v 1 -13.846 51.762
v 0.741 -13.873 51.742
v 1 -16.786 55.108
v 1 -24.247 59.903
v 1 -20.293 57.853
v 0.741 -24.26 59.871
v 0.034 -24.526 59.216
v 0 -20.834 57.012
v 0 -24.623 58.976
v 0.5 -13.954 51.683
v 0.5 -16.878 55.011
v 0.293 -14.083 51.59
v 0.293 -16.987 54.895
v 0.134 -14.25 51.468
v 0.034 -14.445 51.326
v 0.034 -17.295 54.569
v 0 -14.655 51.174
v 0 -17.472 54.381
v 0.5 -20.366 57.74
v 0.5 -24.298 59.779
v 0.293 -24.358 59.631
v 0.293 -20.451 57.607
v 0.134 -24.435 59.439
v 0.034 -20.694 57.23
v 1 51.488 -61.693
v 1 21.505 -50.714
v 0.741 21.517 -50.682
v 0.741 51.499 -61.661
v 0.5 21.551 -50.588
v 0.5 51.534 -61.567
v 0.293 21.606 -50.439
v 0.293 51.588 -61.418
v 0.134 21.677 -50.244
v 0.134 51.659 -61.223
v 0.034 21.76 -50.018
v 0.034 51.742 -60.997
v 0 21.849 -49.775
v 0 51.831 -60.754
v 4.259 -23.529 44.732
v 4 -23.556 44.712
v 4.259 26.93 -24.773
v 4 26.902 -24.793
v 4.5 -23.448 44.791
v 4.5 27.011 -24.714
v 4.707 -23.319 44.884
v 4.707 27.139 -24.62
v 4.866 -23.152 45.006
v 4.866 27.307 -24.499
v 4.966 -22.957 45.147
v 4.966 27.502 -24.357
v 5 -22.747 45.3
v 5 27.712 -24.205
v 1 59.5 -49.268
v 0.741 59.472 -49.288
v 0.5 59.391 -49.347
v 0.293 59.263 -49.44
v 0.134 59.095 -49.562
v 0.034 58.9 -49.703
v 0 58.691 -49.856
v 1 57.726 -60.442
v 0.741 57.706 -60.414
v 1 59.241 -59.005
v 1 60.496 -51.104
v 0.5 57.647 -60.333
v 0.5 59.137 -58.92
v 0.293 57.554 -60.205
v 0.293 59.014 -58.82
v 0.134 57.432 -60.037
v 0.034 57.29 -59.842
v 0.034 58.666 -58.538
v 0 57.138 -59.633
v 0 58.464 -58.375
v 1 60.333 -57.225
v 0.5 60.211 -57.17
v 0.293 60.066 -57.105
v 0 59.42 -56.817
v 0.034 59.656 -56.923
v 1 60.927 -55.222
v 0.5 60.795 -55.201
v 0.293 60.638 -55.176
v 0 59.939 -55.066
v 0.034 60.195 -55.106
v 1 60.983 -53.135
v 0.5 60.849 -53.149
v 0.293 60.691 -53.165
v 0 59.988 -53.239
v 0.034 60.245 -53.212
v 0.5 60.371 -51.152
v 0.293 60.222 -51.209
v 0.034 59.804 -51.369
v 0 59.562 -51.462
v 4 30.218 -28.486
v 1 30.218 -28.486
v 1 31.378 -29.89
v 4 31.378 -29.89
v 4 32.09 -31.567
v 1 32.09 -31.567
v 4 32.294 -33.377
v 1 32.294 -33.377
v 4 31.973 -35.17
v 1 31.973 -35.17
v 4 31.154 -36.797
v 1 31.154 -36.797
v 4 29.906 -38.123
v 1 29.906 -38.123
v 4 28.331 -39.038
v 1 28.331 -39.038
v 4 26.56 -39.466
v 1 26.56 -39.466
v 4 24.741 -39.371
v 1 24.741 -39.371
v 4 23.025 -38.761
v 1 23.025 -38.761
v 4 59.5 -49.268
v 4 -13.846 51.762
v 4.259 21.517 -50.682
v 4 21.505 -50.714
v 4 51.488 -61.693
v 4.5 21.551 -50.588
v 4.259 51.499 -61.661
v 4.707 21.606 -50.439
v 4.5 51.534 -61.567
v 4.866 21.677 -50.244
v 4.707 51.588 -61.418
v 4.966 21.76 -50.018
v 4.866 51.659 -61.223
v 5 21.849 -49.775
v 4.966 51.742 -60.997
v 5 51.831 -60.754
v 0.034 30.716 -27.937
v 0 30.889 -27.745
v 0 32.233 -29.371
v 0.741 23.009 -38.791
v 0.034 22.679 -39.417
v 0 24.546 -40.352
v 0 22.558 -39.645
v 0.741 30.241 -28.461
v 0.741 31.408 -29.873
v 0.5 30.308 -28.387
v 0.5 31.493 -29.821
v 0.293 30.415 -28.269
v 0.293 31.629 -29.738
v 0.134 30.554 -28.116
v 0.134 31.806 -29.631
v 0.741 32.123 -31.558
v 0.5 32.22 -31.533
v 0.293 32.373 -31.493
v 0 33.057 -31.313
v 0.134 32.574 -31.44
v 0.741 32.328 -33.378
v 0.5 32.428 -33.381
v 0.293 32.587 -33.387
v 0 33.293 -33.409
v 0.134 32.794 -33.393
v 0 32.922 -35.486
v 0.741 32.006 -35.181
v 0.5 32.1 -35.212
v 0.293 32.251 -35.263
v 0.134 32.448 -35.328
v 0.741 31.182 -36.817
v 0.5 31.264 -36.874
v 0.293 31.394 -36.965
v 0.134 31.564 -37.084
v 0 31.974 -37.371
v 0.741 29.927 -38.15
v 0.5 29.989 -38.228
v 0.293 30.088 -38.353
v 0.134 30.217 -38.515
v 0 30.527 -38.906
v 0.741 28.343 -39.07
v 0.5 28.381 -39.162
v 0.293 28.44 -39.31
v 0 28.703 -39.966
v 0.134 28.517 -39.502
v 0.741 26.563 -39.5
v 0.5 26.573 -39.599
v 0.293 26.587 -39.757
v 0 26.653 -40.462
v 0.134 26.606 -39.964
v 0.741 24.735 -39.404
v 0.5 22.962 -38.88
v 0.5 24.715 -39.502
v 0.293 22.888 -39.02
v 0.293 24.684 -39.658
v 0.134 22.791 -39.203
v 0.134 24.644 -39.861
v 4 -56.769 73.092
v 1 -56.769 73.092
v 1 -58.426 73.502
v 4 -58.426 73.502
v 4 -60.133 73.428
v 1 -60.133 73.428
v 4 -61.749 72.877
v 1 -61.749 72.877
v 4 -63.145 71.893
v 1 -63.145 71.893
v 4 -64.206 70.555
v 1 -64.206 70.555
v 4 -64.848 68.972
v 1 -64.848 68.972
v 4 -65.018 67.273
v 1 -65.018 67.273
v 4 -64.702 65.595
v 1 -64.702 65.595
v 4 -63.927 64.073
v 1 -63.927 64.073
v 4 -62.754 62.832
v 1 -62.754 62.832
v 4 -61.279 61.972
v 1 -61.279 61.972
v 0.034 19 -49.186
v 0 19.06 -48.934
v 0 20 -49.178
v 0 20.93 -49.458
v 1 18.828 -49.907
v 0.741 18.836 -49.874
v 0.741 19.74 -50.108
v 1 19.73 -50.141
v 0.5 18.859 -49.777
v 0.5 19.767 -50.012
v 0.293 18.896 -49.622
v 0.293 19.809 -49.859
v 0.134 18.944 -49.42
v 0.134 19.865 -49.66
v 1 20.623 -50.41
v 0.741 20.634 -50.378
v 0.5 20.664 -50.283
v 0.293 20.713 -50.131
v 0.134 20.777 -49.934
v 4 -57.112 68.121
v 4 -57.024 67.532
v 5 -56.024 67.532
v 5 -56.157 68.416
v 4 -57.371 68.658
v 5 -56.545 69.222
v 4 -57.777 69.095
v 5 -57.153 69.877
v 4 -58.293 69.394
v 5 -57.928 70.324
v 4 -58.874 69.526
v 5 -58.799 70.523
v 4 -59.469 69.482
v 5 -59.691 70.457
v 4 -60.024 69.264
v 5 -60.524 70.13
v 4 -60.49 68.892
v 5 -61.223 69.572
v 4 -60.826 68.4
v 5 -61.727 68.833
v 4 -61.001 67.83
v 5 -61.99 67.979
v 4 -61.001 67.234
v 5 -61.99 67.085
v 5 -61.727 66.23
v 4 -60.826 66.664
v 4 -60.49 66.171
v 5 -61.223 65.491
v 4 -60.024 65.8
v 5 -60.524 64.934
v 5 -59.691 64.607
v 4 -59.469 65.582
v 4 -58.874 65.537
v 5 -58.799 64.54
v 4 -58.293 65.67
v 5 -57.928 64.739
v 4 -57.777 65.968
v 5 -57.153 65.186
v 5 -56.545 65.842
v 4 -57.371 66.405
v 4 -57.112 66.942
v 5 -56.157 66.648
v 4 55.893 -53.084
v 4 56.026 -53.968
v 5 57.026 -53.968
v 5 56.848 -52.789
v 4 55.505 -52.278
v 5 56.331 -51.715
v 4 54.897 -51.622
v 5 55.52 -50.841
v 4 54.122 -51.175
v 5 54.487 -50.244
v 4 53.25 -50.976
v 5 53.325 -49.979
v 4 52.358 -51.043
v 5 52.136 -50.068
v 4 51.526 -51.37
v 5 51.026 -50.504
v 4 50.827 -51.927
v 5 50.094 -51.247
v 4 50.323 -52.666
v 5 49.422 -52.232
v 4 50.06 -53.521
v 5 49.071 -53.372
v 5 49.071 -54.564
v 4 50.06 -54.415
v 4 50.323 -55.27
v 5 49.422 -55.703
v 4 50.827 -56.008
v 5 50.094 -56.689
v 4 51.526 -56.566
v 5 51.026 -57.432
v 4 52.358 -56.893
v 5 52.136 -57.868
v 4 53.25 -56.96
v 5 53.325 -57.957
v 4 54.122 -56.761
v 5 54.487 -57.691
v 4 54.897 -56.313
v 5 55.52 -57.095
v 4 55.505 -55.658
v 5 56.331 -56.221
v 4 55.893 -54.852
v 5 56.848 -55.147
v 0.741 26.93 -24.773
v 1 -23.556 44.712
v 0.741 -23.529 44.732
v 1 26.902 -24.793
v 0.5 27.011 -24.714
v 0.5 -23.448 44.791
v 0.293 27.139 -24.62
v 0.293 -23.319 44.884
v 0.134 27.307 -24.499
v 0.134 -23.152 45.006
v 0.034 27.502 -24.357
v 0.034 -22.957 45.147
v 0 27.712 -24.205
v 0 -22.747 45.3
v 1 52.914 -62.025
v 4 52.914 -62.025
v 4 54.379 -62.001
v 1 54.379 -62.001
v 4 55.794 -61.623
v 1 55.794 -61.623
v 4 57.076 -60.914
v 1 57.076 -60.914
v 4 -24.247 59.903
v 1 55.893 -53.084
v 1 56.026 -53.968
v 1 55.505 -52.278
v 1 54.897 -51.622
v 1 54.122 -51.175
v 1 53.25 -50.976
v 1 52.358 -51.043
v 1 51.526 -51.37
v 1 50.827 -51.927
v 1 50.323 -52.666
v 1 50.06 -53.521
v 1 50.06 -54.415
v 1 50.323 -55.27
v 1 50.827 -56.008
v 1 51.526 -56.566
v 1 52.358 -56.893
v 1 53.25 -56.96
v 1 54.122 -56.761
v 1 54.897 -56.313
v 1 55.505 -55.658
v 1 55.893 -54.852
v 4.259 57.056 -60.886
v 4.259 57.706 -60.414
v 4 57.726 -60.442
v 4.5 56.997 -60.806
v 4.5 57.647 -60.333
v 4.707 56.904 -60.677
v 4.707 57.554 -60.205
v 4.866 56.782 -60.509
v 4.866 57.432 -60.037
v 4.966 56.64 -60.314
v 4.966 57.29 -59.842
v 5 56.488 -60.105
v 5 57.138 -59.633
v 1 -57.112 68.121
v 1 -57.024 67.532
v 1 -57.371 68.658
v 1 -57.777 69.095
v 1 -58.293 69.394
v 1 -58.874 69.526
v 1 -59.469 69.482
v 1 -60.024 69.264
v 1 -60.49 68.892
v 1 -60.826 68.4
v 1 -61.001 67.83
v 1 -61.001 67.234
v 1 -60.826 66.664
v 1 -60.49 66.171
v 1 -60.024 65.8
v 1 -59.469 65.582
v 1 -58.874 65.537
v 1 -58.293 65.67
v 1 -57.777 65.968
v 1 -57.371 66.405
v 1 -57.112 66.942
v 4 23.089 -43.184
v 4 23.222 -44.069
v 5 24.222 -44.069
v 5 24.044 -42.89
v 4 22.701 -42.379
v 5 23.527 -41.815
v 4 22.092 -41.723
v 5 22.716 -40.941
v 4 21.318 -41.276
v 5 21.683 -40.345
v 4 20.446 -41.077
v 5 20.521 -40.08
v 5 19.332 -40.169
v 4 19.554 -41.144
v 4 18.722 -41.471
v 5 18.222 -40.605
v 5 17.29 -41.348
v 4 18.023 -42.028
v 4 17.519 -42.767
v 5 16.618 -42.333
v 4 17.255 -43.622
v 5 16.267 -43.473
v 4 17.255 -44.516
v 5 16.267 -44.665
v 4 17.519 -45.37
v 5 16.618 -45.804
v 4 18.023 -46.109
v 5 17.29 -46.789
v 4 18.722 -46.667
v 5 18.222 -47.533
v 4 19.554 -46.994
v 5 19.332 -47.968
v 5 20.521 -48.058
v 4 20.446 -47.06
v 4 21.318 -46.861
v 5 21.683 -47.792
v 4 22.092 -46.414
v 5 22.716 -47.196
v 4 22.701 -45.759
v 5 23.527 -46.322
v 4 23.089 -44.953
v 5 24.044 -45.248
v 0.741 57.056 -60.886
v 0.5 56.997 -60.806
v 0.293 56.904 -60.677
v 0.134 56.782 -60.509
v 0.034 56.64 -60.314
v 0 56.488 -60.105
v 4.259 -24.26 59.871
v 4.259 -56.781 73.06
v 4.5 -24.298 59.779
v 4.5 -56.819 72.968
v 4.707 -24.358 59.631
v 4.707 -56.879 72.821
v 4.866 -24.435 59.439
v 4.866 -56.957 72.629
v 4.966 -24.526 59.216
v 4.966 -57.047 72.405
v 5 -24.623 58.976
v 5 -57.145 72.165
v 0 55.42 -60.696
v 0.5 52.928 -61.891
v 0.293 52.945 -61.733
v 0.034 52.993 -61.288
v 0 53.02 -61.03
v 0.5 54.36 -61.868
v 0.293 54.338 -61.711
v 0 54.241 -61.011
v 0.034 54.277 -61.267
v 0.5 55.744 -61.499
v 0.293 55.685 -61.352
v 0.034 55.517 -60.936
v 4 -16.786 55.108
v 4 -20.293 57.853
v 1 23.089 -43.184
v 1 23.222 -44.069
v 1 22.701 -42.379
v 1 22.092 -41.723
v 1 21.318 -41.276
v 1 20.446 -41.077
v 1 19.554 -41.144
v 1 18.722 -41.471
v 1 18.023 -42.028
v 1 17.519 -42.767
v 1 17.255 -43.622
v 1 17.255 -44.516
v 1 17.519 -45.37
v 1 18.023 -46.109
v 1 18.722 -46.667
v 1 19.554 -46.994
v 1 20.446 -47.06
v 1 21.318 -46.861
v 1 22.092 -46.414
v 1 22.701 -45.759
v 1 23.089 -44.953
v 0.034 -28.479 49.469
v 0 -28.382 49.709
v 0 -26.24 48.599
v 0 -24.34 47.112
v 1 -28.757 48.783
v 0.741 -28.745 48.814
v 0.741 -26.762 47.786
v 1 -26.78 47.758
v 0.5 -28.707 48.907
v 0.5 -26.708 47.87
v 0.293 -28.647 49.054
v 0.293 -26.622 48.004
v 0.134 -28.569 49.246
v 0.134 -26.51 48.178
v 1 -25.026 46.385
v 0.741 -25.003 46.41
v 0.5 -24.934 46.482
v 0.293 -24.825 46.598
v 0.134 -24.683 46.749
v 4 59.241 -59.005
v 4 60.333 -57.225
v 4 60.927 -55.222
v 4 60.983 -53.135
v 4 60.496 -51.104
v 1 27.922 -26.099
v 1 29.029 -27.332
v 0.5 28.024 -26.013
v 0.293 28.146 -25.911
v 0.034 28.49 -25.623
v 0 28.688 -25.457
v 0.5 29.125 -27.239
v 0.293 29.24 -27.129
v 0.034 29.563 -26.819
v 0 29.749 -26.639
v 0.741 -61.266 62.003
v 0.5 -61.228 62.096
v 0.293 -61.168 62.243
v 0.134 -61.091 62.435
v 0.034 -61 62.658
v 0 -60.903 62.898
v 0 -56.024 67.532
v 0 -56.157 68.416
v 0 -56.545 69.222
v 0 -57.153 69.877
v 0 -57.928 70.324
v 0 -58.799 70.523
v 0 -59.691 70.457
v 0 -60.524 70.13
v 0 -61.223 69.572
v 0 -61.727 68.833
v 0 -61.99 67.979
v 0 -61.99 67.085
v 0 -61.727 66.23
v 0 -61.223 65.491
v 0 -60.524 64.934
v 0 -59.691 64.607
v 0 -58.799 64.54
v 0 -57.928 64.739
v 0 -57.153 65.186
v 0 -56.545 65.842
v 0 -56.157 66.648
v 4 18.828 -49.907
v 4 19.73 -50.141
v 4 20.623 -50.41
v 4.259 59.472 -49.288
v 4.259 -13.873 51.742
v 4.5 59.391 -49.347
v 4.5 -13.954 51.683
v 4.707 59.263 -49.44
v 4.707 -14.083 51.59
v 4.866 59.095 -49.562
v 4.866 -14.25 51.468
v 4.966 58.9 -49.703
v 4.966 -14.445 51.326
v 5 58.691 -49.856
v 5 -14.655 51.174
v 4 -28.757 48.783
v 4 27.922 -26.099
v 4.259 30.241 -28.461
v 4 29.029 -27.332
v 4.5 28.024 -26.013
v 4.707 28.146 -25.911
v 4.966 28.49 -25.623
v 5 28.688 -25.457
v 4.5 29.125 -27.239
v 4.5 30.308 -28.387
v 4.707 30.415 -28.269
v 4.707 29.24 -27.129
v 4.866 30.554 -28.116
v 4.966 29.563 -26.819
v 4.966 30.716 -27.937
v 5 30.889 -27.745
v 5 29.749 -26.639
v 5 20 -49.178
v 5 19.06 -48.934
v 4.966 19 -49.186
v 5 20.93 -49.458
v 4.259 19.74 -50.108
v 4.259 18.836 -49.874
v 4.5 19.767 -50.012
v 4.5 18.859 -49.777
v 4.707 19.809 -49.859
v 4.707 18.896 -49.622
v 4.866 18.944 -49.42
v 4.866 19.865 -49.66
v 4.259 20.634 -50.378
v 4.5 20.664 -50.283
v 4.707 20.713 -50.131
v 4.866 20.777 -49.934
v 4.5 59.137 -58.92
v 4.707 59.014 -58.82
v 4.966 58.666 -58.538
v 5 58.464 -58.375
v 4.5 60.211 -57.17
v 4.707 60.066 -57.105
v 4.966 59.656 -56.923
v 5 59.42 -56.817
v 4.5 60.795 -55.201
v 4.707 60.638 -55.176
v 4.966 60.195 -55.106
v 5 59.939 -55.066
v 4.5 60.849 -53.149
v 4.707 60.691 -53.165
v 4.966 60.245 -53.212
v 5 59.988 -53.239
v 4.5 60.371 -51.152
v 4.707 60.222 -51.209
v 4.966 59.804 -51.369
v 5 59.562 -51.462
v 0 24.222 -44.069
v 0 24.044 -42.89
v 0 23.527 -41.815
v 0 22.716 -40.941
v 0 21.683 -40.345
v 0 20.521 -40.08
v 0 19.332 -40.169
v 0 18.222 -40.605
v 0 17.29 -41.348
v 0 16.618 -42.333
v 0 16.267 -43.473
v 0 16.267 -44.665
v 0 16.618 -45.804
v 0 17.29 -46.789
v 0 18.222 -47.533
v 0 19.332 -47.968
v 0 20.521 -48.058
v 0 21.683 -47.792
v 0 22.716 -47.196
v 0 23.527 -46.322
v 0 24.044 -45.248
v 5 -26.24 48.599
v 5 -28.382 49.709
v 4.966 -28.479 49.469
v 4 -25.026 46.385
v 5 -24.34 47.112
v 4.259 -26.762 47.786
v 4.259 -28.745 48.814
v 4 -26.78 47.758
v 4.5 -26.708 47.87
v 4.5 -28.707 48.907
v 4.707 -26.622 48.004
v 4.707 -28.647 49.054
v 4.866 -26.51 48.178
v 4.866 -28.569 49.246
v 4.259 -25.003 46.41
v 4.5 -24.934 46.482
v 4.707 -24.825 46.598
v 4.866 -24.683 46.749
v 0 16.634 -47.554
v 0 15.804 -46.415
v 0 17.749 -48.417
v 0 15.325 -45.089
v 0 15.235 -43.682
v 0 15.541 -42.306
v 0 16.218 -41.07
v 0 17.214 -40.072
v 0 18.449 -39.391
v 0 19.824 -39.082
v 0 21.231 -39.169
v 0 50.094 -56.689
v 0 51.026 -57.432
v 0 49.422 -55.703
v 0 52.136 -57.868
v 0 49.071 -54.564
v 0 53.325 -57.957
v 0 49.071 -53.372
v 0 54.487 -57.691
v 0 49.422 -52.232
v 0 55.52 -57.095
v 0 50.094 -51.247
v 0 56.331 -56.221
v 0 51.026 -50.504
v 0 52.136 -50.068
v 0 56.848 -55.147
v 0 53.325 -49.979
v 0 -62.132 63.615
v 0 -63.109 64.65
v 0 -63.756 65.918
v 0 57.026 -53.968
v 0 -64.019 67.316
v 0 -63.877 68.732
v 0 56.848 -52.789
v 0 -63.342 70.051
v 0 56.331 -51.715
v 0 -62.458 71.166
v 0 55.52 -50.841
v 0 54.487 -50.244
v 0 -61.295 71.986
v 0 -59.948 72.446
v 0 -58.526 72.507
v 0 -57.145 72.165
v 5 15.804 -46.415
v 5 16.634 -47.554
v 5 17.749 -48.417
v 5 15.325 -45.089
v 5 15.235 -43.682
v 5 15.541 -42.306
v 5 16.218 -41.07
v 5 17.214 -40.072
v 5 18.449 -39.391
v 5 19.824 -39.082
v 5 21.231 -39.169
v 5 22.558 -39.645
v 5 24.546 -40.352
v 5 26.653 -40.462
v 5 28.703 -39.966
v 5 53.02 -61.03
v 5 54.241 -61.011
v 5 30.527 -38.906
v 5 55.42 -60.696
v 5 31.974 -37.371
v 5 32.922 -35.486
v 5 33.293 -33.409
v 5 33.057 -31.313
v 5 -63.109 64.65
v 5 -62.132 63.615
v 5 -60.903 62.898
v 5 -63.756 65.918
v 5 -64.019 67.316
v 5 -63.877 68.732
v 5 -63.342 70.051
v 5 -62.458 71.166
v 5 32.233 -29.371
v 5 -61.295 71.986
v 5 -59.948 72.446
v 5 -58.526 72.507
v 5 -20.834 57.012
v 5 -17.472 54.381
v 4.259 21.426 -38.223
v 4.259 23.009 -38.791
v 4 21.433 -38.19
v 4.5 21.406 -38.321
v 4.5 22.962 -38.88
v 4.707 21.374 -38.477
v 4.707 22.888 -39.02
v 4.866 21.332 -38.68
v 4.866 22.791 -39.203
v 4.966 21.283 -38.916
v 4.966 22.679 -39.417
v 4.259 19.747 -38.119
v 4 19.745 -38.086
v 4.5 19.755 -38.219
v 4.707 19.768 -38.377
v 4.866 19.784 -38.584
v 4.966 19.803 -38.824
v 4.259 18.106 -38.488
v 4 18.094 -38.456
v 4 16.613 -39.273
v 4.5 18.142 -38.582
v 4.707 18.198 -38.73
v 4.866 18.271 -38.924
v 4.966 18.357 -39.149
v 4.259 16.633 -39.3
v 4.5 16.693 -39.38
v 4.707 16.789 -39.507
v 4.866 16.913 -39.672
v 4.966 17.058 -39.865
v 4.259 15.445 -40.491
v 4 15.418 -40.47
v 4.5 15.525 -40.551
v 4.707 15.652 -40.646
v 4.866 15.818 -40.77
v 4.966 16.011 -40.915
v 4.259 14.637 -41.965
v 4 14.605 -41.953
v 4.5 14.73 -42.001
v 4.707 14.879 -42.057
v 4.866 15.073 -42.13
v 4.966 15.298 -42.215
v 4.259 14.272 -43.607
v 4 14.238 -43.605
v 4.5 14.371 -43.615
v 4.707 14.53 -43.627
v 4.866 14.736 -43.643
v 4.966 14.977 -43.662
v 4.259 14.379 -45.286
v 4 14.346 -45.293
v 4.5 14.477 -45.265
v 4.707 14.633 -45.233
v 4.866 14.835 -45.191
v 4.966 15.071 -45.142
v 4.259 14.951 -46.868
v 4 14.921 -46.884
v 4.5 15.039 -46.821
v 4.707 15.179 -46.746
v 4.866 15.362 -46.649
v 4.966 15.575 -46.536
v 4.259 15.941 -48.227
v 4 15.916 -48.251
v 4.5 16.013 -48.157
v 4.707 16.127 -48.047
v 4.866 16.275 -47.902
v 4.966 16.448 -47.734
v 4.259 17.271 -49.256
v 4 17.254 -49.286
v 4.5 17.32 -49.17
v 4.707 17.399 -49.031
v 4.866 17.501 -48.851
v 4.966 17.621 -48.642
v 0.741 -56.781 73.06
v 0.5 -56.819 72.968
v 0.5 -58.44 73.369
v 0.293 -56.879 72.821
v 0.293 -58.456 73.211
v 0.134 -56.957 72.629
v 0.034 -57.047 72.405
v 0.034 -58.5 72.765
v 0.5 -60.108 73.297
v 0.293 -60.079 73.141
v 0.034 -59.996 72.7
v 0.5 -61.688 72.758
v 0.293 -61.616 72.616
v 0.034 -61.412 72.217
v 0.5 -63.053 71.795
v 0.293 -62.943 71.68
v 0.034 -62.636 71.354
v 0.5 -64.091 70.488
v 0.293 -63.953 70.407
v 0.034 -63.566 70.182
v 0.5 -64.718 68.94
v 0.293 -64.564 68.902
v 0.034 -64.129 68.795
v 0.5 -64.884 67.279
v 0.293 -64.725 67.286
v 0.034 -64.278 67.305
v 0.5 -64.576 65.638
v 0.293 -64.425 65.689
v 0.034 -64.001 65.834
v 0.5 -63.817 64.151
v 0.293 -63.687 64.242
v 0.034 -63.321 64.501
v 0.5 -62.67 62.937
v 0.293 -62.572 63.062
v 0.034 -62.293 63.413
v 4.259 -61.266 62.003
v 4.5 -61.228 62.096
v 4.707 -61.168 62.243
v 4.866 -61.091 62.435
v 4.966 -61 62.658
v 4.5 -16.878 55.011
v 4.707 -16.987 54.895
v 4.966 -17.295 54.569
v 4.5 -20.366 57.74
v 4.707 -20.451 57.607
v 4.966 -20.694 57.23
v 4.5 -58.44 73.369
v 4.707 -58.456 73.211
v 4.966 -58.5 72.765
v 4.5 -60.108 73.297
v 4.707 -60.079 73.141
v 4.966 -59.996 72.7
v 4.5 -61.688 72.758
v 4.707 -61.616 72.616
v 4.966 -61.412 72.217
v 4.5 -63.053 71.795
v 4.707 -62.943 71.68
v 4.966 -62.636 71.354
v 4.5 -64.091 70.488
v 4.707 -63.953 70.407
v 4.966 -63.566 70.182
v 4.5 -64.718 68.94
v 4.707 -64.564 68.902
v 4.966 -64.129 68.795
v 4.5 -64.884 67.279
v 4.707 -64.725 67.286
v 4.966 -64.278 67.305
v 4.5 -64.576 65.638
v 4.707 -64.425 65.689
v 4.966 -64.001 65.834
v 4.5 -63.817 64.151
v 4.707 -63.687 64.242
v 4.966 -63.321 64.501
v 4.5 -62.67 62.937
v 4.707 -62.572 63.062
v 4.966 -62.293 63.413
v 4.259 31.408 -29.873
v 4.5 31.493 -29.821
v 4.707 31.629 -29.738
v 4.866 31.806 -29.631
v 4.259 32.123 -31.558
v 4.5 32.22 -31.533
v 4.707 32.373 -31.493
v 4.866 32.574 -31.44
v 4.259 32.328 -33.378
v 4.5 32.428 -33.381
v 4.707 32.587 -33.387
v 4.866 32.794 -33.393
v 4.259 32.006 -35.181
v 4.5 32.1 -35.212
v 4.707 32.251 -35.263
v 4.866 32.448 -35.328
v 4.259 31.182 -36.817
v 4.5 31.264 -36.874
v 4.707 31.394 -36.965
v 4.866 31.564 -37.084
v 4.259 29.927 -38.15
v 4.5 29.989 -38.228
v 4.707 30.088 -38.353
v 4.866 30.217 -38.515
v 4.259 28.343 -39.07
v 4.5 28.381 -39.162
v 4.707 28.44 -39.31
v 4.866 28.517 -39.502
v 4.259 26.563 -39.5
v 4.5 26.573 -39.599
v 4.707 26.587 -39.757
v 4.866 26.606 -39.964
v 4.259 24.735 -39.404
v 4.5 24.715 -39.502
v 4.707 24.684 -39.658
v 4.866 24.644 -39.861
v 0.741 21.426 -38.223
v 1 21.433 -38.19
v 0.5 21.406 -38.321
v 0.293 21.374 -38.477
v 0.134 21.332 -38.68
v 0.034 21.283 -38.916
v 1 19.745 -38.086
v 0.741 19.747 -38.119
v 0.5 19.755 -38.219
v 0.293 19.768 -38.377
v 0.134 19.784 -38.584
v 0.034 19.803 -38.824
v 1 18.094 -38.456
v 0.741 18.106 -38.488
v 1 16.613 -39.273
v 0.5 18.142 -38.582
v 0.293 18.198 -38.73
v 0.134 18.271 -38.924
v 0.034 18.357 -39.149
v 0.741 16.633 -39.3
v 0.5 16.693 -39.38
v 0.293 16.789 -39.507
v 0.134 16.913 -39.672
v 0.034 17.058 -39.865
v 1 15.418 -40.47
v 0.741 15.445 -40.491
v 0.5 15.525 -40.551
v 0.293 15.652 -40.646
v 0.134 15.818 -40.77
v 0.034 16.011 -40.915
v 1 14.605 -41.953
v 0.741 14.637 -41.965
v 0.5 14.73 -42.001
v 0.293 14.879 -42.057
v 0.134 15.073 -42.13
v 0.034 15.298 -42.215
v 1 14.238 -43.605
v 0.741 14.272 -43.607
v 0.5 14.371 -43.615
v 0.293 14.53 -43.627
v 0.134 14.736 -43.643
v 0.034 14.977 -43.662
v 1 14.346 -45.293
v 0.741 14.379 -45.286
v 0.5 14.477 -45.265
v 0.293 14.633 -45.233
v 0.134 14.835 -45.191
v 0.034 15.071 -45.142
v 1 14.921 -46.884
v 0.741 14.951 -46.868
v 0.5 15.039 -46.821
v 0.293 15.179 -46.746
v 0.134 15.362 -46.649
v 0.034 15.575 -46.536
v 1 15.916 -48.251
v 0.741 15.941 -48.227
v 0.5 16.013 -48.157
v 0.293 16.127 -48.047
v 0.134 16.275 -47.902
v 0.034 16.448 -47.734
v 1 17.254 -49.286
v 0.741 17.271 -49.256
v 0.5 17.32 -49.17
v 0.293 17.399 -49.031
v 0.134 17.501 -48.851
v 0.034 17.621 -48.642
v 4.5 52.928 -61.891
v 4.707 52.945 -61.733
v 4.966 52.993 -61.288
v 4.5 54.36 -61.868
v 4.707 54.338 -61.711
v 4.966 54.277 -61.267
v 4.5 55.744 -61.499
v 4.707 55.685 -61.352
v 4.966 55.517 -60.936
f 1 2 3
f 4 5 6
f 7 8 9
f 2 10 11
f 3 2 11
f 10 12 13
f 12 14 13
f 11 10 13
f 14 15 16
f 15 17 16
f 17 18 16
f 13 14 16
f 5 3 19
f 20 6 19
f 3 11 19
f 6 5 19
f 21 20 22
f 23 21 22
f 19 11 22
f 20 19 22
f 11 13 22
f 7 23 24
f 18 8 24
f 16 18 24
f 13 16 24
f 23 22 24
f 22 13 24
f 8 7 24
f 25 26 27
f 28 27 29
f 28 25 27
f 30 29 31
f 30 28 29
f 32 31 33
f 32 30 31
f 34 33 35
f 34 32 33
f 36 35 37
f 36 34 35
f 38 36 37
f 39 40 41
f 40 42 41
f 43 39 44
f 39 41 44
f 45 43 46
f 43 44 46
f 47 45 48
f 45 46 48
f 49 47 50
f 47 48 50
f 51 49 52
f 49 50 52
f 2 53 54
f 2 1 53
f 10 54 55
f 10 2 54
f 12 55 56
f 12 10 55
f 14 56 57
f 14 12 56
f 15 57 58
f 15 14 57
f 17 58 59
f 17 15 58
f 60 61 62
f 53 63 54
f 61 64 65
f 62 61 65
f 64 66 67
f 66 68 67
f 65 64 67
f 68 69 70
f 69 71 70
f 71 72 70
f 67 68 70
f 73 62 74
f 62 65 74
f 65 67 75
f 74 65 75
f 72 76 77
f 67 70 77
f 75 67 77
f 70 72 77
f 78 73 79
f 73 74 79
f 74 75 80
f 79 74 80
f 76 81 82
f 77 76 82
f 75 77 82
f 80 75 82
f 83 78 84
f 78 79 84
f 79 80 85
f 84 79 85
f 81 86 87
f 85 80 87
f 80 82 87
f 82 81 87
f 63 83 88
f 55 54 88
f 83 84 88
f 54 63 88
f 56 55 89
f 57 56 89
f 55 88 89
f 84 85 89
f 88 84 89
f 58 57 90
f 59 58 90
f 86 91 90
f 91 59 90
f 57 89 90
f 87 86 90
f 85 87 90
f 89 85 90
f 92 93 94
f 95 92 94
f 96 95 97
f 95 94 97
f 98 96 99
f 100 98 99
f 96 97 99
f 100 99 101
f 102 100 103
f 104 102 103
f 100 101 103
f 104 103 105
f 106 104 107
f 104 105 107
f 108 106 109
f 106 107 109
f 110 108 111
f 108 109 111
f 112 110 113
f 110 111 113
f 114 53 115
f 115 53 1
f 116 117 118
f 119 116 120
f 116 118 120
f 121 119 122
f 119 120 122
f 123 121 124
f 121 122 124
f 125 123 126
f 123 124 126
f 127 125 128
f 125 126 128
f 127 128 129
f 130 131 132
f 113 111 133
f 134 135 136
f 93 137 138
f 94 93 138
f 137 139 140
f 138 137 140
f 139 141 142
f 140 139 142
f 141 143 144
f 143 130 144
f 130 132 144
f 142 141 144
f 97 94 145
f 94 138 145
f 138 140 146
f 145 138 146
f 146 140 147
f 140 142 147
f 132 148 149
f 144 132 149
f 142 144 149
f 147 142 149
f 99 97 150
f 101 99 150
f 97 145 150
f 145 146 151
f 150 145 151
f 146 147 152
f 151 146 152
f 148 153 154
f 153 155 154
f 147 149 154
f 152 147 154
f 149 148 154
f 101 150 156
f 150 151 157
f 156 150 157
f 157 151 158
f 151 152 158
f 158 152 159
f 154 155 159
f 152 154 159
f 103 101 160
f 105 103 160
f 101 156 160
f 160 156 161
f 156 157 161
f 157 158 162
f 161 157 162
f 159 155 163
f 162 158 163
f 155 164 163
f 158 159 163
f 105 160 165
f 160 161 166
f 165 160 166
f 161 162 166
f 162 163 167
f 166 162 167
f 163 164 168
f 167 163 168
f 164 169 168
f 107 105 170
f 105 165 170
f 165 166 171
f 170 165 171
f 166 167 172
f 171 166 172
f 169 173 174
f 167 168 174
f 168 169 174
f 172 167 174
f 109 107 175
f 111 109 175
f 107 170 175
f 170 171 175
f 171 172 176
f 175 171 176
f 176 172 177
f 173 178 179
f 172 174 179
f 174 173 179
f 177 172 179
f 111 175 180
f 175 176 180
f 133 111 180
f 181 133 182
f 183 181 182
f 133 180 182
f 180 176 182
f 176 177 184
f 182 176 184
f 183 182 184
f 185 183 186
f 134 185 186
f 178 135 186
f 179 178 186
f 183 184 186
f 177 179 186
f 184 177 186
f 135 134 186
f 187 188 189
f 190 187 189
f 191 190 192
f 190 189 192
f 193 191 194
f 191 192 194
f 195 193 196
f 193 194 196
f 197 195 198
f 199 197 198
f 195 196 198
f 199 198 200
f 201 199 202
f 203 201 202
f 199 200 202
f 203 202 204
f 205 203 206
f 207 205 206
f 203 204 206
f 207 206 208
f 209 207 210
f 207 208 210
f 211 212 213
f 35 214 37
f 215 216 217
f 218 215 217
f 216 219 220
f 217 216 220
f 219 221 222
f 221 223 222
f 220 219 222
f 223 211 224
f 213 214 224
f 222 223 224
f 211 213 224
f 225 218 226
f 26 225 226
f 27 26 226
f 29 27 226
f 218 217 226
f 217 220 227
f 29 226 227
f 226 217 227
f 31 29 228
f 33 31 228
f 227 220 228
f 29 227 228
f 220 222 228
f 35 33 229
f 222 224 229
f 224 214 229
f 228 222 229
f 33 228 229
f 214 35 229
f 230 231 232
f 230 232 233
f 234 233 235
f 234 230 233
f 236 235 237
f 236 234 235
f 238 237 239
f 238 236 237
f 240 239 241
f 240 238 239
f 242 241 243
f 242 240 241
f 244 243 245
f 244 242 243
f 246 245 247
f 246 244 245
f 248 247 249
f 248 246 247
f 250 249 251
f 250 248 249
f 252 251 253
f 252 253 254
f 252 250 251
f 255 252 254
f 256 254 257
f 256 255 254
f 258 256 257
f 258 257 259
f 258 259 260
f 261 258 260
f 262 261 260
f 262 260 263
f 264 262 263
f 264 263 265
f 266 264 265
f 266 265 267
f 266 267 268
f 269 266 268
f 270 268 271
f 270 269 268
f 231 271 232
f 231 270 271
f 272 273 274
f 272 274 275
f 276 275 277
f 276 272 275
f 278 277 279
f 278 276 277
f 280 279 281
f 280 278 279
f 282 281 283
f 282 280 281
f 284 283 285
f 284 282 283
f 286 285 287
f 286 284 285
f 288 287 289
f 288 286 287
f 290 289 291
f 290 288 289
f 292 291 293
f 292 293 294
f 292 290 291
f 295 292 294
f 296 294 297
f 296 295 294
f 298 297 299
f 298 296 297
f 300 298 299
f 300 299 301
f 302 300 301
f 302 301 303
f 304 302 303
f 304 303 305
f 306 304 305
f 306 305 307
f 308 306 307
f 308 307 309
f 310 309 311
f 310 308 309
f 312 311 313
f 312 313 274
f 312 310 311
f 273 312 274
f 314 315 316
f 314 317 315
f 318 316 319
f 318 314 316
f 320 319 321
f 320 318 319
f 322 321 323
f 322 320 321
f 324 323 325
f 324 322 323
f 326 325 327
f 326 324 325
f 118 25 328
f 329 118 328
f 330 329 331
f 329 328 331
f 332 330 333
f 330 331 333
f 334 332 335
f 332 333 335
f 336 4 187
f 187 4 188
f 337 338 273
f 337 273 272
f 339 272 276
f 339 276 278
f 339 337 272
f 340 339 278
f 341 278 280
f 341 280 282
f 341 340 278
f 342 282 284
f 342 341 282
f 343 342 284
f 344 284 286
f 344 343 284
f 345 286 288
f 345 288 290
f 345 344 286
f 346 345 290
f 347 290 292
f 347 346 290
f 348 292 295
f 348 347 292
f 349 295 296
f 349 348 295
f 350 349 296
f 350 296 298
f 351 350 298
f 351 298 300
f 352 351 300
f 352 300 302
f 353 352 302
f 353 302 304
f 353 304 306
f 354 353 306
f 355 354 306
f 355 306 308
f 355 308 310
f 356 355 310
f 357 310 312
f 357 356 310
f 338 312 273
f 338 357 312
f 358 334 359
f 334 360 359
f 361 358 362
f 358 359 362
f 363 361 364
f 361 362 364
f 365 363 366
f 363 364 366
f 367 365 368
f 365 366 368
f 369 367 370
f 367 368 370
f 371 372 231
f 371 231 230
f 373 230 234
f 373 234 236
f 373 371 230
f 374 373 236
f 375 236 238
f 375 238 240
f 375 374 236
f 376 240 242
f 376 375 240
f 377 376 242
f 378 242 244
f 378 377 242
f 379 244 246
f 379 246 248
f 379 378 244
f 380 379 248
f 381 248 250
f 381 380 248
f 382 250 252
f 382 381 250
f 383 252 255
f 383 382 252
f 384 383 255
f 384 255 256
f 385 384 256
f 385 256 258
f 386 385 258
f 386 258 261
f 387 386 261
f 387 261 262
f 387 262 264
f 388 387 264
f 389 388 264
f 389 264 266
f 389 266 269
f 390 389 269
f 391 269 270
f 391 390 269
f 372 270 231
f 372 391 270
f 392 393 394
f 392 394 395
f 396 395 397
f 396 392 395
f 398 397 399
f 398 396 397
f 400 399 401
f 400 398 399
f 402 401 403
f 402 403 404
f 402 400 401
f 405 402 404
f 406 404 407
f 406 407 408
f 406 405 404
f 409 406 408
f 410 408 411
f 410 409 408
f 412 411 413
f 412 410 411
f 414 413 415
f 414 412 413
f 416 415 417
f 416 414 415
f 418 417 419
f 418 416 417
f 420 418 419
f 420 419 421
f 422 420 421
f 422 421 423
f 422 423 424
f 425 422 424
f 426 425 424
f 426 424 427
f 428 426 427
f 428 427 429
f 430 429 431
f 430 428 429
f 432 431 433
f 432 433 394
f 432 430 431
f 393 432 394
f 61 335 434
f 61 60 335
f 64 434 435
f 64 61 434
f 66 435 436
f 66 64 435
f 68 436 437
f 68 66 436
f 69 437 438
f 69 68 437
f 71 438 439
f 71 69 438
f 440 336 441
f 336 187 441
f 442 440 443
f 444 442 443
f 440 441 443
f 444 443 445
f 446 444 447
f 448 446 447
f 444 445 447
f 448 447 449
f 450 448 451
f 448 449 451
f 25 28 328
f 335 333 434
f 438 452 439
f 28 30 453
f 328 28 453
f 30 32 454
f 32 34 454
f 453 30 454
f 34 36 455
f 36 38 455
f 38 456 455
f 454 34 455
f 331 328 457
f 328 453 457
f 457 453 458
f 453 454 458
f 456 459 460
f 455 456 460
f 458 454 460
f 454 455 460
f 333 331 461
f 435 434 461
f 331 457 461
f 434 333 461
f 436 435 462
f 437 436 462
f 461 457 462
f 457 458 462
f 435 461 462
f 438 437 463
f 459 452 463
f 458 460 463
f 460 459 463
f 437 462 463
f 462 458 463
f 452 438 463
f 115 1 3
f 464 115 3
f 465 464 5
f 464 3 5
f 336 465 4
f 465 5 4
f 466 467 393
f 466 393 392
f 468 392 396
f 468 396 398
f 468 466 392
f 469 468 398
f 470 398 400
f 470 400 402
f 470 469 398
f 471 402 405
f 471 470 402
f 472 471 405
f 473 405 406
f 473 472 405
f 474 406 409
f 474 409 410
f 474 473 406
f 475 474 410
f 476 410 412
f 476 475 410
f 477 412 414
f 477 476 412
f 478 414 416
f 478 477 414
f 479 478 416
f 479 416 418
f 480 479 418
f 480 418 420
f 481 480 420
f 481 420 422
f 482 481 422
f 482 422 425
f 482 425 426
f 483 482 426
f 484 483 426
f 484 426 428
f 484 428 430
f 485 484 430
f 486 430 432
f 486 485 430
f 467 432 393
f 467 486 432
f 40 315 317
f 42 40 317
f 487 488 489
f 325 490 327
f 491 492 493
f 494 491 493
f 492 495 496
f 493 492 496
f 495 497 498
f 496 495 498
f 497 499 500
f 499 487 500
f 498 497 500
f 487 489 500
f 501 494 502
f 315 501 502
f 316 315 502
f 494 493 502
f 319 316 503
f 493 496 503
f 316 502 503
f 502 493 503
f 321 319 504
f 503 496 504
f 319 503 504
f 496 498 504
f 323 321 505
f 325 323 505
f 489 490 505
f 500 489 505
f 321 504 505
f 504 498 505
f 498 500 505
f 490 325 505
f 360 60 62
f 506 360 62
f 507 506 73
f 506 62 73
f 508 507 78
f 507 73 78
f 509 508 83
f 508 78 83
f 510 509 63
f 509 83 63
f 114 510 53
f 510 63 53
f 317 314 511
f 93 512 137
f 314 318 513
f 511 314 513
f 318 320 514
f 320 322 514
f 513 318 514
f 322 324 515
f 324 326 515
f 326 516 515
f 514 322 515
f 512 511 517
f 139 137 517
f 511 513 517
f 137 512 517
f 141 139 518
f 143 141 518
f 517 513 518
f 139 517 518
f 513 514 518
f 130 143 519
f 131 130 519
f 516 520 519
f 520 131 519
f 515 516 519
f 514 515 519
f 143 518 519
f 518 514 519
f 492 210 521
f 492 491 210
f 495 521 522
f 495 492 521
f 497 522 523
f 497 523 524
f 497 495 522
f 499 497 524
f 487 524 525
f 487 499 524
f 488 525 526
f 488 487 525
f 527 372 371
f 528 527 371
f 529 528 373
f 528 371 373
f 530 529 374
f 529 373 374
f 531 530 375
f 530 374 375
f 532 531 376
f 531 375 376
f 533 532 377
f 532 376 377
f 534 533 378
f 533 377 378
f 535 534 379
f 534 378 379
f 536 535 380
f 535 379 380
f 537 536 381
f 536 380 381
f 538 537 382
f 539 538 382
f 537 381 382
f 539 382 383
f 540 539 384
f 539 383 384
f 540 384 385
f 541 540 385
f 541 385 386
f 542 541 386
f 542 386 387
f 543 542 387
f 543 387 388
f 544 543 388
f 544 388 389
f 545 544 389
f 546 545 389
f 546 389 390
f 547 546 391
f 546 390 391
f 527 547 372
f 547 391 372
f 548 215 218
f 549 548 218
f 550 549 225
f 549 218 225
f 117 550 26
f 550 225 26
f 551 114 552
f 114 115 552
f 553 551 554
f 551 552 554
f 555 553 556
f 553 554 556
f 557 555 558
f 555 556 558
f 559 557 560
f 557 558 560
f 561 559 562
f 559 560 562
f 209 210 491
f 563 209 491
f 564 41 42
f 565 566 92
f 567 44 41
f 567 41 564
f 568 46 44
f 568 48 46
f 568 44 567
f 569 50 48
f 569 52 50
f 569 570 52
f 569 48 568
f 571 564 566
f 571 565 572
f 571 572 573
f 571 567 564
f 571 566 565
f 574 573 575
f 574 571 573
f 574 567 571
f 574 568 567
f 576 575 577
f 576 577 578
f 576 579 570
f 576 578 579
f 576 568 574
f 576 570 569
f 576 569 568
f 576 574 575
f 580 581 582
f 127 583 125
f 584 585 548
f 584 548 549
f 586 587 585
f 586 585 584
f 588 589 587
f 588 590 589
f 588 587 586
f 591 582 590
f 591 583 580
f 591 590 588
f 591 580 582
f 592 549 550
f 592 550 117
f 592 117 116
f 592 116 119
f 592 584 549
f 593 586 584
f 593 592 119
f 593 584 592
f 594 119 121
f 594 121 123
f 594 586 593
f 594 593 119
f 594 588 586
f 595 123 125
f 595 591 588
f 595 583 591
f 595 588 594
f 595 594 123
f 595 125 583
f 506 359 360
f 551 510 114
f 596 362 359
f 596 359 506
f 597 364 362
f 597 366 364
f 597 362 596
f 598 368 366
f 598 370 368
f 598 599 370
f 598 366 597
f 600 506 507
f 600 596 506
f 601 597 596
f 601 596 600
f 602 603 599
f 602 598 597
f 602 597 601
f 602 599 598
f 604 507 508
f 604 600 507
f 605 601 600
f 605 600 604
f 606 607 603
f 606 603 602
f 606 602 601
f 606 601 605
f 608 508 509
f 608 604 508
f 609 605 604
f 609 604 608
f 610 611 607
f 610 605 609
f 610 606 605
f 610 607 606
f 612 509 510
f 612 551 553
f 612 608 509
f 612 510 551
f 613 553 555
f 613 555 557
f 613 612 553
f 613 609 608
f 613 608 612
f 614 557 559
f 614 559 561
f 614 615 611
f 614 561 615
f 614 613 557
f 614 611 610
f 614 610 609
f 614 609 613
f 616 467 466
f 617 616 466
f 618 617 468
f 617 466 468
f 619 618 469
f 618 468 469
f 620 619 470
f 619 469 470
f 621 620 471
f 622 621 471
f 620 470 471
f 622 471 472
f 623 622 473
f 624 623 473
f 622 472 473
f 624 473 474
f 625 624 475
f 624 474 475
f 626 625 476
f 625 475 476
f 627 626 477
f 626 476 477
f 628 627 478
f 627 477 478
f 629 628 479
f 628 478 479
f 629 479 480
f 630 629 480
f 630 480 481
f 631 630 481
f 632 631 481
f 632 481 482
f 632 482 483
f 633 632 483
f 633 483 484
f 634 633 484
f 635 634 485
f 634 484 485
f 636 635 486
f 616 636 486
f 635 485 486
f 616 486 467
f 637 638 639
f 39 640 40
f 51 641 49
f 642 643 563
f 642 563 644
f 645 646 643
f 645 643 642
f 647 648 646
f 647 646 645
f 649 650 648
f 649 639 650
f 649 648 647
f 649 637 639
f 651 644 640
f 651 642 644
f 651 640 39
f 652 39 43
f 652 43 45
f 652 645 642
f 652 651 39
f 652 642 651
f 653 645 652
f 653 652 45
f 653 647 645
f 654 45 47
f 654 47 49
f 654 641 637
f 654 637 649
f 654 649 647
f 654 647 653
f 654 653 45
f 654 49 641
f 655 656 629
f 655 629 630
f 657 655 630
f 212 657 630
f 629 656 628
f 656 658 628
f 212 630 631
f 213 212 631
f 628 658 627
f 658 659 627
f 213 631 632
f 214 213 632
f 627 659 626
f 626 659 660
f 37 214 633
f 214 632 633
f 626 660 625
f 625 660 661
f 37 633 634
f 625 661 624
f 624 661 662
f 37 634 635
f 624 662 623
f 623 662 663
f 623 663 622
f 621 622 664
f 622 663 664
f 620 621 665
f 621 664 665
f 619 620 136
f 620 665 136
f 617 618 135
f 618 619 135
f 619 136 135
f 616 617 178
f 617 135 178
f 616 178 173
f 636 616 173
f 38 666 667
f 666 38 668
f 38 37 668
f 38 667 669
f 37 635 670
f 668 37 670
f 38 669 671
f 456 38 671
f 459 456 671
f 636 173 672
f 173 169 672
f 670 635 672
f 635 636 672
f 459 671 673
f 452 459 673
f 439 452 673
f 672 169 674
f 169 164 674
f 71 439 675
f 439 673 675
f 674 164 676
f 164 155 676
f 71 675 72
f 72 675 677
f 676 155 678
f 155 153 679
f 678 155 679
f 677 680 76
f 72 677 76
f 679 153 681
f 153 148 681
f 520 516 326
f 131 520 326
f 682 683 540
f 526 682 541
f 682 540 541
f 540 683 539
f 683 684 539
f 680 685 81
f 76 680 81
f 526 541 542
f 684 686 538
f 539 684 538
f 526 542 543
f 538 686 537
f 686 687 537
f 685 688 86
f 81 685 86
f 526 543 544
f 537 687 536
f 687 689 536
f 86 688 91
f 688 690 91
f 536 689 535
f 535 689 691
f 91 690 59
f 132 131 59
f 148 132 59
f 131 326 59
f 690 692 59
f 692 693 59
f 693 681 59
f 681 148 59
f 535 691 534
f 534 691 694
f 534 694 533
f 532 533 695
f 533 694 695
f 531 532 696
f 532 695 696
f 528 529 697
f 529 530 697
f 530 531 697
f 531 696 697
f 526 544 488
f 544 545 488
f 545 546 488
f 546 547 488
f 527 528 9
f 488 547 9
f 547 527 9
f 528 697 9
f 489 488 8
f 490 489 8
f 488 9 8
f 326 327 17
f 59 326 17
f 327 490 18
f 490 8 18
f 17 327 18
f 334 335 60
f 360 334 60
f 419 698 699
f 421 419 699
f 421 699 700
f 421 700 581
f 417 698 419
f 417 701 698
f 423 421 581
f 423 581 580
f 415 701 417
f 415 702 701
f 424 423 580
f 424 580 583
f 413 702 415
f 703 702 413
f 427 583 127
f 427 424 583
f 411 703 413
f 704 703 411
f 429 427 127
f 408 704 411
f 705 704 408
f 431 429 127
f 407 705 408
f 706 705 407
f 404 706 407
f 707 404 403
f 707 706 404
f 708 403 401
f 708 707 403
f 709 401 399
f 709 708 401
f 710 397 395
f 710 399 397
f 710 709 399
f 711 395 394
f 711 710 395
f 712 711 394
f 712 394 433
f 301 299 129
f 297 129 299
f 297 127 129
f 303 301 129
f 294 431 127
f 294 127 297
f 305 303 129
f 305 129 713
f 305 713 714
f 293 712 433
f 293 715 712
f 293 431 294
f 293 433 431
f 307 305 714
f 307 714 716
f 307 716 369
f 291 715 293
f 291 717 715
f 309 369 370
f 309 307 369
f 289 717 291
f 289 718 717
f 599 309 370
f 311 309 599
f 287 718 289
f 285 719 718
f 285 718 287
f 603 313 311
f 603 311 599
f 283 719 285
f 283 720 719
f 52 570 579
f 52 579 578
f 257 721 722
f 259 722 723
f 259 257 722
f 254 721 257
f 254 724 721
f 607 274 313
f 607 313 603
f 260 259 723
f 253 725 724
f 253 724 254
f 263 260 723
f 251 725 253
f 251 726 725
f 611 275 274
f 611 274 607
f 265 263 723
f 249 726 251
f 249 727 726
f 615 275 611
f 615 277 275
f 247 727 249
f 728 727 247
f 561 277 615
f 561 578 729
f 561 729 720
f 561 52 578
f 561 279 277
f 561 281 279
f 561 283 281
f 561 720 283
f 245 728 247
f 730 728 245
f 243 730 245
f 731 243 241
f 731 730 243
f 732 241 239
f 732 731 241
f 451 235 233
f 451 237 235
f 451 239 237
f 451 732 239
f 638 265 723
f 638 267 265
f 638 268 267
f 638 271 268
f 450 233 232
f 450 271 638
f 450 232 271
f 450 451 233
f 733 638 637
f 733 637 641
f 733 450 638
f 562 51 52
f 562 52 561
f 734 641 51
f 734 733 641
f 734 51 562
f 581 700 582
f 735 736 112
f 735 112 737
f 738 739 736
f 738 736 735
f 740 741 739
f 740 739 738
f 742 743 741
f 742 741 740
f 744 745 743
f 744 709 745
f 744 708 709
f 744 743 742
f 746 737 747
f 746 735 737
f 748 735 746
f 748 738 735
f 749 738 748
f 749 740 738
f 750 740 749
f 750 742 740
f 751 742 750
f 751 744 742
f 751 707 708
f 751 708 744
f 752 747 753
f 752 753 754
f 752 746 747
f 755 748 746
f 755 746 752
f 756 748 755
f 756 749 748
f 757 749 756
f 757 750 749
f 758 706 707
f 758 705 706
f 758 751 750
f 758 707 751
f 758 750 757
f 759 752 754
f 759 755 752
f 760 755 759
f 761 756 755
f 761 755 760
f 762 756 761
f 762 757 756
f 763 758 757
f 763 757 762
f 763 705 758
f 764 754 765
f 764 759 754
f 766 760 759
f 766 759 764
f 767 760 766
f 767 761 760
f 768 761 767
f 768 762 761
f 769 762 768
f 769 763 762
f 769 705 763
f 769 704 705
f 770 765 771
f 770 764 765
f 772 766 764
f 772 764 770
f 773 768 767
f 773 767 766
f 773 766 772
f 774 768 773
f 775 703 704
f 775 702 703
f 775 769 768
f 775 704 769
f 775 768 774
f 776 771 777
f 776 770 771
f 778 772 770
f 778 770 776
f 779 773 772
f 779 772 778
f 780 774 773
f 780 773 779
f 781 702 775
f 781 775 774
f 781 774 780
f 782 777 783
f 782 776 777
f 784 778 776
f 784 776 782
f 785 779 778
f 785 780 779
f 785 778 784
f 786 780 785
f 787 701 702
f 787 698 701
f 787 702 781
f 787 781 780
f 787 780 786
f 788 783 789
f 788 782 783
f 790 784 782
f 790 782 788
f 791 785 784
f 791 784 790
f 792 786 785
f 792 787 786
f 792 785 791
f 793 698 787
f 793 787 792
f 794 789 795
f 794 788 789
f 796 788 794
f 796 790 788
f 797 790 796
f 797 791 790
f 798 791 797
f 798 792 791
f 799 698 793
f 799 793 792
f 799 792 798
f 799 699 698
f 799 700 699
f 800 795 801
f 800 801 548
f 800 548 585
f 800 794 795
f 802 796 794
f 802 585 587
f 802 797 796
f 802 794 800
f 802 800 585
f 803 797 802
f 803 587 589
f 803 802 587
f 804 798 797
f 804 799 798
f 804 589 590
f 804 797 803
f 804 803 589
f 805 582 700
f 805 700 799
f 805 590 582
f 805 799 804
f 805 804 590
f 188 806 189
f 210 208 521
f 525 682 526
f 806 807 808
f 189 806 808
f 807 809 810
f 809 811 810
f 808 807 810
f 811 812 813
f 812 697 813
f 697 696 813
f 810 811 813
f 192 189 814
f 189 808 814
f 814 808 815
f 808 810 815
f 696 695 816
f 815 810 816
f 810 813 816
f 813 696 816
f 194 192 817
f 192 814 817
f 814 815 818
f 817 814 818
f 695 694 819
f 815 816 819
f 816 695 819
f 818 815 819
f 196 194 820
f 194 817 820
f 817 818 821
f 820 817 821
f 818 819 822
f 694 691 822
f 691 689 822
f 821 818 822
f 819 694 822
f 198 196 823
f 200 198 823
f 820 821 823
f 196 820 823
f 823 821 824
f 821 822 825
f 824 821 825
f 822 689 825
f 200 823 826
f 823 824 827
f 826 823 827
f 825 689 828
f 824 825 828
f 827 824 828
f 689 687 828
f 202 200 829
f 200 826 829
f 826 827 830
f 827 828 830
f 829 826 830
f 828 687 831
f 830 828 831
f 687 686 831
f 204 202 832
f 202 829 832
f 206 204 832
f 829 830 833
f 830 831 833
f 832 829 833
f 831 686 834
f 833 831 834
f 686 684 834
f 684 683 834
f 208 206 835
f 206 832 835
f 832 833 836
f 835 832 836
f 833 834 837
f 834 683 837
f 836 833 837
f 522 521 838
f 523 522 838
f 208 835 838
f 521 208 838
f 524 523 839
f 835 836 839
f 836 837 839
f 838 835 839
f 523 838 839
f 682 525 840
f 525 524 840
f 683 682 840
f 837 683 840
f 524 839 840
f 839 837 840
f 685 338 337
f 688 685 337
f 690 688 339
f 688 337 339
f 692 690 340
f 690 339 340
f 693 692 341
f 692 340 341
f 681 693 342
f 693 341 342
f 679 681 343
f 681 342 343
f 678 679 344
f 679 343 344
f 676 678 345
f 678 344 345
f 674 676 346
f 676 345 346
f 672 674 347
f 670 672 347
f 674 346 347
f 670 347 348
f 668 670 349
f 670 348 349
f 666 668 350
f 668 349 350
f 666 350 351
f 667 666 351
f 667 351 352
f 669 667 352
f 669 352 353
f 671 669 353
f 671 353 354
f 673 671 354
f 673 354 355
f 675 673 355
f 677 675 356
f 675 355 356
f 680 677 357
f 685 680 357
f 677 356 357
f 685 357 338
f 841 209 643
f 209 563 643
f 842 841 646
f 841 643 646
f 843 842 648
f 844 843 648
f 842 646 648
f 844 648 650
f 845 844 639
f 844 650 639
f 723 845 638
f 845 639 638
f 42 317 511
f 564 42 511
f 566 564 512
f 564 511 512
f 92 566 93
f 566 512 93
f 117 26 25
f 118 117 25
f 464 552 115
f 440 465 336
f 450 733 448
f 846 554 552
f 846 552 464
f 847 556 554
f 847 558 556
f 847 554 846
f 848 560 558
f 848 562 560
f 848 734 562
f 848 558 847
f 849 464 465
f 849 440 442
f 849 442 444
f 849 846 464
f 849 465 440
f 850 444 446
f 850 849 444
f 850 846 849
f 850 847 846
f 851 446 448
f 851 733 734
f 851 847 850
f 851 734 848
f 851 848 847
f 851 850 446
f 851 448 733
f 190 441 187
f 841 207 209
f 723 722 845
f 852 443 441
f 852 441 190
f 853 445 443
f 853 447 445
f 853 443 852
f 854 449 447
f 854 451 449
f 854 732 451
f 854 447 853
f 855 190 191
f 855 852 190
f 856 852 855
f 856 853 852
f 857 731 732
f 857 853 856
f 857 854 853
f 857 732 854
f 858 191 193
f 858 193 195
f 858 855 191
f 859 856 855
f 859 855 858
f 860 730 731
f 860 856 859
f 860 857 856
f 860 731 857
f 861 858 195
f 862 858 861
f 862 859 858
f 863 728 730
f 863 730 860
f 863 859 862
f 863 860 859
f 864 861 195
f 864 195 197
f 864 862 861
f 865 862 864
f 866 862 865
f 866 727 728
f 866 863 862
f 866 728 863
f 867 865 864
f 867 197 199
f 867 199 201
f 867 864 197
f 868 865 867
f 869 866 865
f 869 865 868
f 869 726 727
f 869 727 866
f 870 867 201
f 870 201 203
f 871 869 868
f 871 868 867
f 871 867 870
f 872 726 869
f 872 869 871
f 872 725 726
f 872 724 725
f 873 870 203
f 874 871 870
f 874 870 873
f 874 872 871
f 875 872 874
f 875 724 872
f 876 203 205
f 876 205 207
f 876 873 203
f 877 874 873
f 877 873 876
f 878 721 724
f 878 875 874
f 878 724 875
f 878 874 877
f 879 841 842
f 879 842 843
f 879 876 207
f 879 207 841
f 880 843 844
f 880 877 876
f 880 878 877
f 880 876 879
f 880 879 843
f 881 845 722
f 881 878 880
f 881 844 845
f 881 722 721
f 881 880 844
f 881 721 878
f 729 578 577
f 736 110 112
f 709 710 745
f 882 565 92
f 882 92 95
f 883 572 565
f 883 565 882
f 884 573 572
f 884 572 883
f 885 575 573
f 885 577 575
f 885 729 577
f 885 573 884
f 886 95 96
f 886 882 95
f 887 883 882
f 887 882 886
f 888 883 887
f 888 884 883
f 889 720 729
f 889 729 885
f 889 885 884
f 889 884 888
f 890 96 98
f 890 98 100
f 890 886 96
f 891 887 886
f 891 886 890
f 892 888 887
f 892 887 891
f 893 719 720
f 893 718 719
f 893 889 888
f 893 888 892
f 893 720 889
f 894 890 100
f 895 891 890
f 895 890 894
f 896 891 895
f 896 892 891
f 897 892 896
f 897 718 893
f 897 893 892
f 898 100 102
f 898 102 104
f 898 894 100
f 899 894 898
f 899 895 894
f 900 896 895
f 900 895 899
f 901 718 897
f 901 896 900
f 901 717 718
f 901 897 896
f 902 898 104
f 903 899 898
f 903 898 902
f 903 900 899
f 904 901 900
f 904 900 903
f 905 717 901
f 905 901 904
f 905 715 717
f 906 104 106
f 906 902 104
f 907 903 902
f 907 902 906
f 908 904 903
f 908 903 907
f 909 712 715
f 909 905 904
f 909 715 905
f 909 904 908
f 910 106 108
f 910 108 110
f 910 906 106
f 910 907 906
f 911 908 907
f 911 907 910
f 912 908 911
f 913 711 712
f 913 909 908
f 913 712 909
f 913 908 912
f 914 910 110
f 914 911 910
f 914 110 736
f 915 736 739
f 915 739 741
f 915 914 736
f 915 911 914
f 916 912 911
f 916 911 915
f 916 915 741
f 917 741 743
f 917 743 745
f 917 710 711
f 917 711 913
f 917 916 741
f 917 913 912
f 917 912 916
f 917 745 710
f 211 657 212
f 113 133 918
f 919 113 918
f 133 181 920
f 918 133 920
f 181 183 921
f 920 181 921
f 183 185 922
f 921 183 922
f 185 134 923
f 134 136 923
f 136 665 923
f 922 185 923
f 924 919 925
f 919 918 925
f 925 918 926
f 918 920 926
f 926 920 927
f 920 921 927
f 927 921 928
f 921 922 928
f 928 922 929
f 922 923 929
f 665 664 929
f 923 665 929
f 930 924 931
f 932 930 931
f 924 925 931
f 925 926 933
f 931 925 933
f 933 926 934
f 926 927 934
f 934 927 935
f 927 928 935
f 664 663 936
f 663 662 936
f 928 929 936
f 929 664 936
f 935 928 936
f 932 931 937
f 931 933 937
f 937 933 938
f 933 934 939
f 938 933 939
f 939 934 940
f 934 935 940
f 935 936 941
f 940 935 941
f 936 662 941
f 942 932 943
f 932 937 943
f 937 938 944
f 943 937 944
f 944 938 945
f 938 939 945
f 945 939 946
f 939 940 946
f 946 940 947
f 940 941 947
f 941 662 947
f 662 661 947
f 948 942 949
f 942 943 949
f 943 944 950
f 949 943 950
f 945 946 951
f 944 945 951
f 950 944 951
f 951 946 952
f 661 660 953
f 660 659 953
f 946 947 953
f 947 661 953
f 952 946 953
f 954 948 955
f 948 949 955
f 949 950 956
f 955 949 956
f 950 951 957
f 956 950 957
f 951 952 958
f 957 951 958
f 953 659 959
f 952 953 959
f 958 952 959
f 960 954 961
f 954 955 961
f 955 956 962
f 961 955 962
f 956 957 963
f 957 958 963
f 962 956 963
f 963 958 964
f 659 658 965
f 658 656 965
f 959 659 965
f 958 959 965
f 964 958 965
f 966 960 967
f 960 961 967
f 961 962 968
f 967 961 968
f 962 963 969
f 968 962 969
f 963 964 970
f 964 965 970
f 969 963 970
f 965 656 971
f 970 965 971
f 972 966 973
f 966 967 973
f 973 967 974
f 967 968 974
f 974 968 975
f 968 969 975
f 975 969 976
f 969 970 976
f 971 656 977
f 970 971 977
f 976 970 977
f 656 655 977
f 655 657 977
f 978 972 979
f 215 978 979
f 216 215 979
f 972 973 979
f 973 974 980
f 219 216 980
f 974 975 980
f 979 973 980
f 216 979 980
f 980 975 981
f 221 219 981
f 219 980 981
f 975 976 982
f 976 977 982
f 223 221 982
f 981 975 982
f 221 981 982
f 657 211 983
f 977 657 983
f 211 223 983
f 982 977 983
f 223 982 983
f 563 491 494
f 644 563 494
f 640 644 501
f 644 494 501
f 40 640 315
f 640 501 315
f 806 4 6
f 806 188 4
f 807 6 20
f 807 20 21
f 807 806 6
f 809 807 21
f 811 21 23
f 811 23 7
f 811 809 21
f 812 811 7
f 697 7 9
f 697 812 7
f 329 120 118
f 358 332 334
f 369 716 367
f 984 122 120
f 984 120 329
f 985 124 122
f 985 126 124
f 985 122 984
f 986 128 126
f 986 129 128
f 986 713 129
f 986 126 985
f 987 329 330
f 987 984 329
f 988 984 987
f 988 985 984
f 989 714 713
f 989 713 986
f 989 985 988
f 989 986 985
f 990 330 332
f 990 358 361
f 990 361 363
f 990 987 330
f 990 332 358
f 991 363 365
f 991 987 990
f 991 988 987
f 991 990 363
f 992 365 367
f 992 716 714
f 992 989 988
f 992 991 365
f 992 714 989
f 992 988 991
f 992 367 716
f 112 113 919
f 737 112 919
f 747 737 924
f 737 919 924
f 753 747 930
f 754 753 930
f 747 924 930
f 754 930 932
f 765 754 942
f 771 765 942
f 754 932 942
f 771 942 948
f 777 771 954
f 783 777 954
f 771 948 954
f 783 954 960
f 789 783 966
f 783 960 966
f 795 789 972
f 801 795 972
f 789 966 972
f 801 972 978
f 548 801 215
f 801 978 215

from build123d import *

# Parameters (mm, degrees)
F0_R     = 3
F0_R_2   = 2
F1_DEPTH = 5
F2_R     = 1
F3_SIZE  = 1


with BuildPart() as f1:
    # F0 (on Right) → F1 (new body)
    with BuildSketch(Plane.YZ):
        with BuildLine():
            ThreePointArc((57.72593, -60.441806), (60.927082, -55.222327), (59.49991, -49.268042))
            Line((59.49991, -49.268042), (-13.845659, 51.761887))
            ThreePointArc((-13.845659, 51.761887), (-18.475487, 56.562027), (-24.247485, 59.902791))
            Line((-24.247485, 59.902791), (-56.768679, 73.091937))
            ThreePointArc((-56.768679, 73.091937), (-64.583772, 69.786739), (-61.278574, 61.971647))
            Line((-61.278574, 61.971647), (-28.757379, 48.7825))
            ThreePointArc((-28.757379, 48.7825), (-25.87138, 47.112118), (-23.556466, 44.712049))
            Line((-23.556466, 44.712049), (26.902381, -24.792543))
            ThreePointArc((26.902381, -24.792543), (28.464555, -26.725344), (30.218225, -28.486239))
            ThreePointArc((30.218225, -28.486239), (31.154485, -36.797105), (23.024955, -38.761238))
            ThreePointArc((23.024955, -38.761238), (14.604776, -41.953407), (18.827654, -49.906813))
            ThreePointArc((18.827654, -49.906813), (20.17817, -50.271255), (21.505159, -50.713759))
            Line((21.505159, -50.713759), (51.487555, -61.692687))
            ThreePointArc((51.487555, -61.692687), (54.378812, -62.001114), (57.075581, -60.913946))
            Line((57.075581, -60.913946), (57.72593, -60.441806))
        make_face()
        with Locations((20.221904, -44.068756)):
            Circle(F0_R, mode=Mode.SUBTRACT)
        with Locations((53.026038, -53.967934)):
            Circle(F0_R, mode=Mode.SUBTRACT)
        with Locations((-59.023626, 67.531792)):
            Circle(F0_R_2, mode=Mode.SUBTRACT)
    extrude(amount=F1_DEPTH)

    # F2
    f2_edges = [f1.edges().sort_by_distance(p)[0] for p in [
        (0, -40.508082, 66.497364),
        (5, -40.508082, 66.497364),
    ]]
    fillet(f2_edges, radius=F2_R)

    # F3
    f3_edges = [f1.edges().sort_by_distance(p)[0] for p in [
        (5, 17.221904, -44.068756),
        (0, 17.221904, -44.068756),
        (5, 50.026038, -53.967934),
        (0, 50.026038, -53.967934),
        (0, -61.023626, 67.531792),
        (5, -61.023626, 67.531792),
    ]]
    chamfer(f3_edges, length=F3_SIZE)


solid = f1.part
